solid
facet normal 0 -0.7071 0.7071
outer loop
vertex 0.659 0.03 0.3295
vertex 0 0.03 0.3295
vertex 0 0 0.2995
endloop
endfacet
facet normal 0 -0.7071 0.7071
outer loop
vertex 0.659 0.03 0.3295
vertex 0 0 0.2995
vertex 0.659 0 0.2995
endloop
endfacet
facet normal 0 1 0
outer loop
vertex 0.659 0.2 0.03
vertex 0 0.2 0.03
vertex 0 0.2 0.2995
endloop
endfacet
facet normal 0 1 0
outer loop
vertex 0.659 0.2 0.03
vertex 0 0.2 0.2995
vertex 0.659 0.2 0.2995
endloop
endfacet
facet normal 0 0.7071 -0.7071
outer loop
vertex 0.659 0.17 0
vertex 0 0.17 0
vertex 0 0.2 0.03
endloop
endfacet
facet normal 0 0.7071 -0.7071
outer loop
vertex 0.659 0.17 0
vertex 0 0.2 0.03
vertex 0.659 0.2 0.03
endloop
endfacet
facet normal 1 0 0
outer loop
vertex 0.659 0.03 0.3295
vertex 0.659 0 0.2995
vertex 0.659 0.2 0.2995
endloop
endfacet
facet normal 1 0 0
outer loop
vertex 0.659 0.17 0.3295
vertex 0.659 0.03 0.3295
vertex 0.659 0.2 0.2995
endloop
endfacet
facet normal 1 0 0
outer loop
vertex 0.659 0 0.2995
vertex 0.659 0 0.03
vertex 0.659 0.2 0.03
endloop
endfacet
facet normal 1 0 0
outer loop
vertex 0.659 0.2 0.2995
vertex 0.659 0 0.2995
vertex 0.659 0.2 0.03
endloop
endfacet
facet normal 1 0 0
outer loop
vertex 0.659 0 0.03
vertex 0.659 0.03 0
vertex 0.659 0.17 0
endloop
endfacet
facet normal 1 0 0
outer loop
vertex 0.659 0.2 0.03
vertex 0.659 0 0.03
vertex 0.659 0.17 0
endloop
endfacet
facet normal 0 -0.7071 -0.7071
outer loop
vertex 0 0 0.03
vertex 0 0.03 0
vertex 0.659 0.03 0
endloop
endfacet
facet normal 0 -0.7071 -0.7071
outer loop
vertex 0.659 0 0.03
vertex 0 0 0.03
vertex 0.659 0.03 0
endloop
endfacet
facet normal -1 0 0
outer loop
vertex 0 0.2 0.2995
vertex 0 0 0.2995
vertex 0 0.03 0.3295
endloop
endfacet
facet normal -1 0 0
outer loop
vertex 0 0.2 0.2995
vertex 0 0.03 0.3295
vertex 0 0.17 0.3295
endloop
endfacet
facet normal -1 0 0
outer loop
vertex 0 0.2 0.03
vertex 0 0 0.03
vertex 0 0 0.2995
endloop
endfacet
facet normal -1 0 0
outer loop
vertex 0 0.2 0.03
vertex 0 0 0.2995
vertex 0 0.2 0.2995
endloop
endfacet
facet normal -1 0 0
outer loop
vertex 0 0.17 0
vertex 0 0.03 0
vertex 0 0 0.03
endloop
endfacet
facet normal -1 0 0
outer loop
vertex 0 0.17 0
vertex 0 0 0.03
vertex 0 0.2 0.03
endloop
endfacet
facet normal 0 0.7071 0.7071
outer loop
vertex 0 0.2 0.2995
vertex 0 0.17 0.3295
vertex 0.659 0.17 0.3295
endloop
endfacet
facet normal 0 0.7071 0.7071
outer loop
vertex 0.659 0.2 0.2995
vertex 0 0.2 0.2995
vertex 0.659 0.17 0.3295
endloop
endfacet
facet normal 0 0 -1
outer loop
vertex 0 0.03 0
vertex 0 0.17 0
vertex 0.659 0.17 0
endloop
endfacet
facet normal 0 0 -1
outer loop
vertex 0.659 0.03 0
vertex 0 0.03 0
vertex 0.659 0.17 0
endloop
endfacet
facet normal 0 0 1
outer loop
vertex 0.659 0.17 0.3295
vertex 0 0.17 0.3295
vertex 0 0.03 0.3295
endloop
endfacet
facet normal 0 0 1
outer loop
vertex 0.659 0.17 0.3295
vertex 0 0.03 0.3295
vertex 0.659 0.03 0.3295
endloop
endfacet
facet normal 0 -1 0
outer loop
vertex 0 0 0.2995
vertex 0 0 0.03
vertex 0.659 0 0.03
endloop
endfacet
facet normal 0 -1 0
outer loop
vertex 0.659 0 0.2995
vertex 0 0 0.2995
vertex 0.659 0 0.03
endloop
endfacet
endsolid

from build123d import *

# Parameters (mm, degrees)
SKETCH1_W           = 0.659
SKETCH1_H           = 0.2
BOSS_EXTRUDE1_DEPTH = 0.3295
CHAMFER1_SIZE       = 0.03


with BuildPart() as part:
    # Sketch1 → Boss-Extrude1 (new body)
    with BuildSketch(Plane.XY):
        with Locations((0.3295, 0.1)):
            Rectangle(SKETCH1_W, SKETCH1_H)
    extrude(amount=BOSS_EXTRUDE1_DEPTH)

    # Chamfer1
    chamfer1_edges = [part.edges().sort_by_distance(p)[0] for p in [
        (0.3295, 0.2, 0.3295),
        (0.3295, 0.2, 0),
        (0.3295, 0, 0),
        (0.3295, 0, 0.3295),
    ]]
    chamfer(chamfer1_edges, length=CHAMFER1_SIZE)


solid = part.part
